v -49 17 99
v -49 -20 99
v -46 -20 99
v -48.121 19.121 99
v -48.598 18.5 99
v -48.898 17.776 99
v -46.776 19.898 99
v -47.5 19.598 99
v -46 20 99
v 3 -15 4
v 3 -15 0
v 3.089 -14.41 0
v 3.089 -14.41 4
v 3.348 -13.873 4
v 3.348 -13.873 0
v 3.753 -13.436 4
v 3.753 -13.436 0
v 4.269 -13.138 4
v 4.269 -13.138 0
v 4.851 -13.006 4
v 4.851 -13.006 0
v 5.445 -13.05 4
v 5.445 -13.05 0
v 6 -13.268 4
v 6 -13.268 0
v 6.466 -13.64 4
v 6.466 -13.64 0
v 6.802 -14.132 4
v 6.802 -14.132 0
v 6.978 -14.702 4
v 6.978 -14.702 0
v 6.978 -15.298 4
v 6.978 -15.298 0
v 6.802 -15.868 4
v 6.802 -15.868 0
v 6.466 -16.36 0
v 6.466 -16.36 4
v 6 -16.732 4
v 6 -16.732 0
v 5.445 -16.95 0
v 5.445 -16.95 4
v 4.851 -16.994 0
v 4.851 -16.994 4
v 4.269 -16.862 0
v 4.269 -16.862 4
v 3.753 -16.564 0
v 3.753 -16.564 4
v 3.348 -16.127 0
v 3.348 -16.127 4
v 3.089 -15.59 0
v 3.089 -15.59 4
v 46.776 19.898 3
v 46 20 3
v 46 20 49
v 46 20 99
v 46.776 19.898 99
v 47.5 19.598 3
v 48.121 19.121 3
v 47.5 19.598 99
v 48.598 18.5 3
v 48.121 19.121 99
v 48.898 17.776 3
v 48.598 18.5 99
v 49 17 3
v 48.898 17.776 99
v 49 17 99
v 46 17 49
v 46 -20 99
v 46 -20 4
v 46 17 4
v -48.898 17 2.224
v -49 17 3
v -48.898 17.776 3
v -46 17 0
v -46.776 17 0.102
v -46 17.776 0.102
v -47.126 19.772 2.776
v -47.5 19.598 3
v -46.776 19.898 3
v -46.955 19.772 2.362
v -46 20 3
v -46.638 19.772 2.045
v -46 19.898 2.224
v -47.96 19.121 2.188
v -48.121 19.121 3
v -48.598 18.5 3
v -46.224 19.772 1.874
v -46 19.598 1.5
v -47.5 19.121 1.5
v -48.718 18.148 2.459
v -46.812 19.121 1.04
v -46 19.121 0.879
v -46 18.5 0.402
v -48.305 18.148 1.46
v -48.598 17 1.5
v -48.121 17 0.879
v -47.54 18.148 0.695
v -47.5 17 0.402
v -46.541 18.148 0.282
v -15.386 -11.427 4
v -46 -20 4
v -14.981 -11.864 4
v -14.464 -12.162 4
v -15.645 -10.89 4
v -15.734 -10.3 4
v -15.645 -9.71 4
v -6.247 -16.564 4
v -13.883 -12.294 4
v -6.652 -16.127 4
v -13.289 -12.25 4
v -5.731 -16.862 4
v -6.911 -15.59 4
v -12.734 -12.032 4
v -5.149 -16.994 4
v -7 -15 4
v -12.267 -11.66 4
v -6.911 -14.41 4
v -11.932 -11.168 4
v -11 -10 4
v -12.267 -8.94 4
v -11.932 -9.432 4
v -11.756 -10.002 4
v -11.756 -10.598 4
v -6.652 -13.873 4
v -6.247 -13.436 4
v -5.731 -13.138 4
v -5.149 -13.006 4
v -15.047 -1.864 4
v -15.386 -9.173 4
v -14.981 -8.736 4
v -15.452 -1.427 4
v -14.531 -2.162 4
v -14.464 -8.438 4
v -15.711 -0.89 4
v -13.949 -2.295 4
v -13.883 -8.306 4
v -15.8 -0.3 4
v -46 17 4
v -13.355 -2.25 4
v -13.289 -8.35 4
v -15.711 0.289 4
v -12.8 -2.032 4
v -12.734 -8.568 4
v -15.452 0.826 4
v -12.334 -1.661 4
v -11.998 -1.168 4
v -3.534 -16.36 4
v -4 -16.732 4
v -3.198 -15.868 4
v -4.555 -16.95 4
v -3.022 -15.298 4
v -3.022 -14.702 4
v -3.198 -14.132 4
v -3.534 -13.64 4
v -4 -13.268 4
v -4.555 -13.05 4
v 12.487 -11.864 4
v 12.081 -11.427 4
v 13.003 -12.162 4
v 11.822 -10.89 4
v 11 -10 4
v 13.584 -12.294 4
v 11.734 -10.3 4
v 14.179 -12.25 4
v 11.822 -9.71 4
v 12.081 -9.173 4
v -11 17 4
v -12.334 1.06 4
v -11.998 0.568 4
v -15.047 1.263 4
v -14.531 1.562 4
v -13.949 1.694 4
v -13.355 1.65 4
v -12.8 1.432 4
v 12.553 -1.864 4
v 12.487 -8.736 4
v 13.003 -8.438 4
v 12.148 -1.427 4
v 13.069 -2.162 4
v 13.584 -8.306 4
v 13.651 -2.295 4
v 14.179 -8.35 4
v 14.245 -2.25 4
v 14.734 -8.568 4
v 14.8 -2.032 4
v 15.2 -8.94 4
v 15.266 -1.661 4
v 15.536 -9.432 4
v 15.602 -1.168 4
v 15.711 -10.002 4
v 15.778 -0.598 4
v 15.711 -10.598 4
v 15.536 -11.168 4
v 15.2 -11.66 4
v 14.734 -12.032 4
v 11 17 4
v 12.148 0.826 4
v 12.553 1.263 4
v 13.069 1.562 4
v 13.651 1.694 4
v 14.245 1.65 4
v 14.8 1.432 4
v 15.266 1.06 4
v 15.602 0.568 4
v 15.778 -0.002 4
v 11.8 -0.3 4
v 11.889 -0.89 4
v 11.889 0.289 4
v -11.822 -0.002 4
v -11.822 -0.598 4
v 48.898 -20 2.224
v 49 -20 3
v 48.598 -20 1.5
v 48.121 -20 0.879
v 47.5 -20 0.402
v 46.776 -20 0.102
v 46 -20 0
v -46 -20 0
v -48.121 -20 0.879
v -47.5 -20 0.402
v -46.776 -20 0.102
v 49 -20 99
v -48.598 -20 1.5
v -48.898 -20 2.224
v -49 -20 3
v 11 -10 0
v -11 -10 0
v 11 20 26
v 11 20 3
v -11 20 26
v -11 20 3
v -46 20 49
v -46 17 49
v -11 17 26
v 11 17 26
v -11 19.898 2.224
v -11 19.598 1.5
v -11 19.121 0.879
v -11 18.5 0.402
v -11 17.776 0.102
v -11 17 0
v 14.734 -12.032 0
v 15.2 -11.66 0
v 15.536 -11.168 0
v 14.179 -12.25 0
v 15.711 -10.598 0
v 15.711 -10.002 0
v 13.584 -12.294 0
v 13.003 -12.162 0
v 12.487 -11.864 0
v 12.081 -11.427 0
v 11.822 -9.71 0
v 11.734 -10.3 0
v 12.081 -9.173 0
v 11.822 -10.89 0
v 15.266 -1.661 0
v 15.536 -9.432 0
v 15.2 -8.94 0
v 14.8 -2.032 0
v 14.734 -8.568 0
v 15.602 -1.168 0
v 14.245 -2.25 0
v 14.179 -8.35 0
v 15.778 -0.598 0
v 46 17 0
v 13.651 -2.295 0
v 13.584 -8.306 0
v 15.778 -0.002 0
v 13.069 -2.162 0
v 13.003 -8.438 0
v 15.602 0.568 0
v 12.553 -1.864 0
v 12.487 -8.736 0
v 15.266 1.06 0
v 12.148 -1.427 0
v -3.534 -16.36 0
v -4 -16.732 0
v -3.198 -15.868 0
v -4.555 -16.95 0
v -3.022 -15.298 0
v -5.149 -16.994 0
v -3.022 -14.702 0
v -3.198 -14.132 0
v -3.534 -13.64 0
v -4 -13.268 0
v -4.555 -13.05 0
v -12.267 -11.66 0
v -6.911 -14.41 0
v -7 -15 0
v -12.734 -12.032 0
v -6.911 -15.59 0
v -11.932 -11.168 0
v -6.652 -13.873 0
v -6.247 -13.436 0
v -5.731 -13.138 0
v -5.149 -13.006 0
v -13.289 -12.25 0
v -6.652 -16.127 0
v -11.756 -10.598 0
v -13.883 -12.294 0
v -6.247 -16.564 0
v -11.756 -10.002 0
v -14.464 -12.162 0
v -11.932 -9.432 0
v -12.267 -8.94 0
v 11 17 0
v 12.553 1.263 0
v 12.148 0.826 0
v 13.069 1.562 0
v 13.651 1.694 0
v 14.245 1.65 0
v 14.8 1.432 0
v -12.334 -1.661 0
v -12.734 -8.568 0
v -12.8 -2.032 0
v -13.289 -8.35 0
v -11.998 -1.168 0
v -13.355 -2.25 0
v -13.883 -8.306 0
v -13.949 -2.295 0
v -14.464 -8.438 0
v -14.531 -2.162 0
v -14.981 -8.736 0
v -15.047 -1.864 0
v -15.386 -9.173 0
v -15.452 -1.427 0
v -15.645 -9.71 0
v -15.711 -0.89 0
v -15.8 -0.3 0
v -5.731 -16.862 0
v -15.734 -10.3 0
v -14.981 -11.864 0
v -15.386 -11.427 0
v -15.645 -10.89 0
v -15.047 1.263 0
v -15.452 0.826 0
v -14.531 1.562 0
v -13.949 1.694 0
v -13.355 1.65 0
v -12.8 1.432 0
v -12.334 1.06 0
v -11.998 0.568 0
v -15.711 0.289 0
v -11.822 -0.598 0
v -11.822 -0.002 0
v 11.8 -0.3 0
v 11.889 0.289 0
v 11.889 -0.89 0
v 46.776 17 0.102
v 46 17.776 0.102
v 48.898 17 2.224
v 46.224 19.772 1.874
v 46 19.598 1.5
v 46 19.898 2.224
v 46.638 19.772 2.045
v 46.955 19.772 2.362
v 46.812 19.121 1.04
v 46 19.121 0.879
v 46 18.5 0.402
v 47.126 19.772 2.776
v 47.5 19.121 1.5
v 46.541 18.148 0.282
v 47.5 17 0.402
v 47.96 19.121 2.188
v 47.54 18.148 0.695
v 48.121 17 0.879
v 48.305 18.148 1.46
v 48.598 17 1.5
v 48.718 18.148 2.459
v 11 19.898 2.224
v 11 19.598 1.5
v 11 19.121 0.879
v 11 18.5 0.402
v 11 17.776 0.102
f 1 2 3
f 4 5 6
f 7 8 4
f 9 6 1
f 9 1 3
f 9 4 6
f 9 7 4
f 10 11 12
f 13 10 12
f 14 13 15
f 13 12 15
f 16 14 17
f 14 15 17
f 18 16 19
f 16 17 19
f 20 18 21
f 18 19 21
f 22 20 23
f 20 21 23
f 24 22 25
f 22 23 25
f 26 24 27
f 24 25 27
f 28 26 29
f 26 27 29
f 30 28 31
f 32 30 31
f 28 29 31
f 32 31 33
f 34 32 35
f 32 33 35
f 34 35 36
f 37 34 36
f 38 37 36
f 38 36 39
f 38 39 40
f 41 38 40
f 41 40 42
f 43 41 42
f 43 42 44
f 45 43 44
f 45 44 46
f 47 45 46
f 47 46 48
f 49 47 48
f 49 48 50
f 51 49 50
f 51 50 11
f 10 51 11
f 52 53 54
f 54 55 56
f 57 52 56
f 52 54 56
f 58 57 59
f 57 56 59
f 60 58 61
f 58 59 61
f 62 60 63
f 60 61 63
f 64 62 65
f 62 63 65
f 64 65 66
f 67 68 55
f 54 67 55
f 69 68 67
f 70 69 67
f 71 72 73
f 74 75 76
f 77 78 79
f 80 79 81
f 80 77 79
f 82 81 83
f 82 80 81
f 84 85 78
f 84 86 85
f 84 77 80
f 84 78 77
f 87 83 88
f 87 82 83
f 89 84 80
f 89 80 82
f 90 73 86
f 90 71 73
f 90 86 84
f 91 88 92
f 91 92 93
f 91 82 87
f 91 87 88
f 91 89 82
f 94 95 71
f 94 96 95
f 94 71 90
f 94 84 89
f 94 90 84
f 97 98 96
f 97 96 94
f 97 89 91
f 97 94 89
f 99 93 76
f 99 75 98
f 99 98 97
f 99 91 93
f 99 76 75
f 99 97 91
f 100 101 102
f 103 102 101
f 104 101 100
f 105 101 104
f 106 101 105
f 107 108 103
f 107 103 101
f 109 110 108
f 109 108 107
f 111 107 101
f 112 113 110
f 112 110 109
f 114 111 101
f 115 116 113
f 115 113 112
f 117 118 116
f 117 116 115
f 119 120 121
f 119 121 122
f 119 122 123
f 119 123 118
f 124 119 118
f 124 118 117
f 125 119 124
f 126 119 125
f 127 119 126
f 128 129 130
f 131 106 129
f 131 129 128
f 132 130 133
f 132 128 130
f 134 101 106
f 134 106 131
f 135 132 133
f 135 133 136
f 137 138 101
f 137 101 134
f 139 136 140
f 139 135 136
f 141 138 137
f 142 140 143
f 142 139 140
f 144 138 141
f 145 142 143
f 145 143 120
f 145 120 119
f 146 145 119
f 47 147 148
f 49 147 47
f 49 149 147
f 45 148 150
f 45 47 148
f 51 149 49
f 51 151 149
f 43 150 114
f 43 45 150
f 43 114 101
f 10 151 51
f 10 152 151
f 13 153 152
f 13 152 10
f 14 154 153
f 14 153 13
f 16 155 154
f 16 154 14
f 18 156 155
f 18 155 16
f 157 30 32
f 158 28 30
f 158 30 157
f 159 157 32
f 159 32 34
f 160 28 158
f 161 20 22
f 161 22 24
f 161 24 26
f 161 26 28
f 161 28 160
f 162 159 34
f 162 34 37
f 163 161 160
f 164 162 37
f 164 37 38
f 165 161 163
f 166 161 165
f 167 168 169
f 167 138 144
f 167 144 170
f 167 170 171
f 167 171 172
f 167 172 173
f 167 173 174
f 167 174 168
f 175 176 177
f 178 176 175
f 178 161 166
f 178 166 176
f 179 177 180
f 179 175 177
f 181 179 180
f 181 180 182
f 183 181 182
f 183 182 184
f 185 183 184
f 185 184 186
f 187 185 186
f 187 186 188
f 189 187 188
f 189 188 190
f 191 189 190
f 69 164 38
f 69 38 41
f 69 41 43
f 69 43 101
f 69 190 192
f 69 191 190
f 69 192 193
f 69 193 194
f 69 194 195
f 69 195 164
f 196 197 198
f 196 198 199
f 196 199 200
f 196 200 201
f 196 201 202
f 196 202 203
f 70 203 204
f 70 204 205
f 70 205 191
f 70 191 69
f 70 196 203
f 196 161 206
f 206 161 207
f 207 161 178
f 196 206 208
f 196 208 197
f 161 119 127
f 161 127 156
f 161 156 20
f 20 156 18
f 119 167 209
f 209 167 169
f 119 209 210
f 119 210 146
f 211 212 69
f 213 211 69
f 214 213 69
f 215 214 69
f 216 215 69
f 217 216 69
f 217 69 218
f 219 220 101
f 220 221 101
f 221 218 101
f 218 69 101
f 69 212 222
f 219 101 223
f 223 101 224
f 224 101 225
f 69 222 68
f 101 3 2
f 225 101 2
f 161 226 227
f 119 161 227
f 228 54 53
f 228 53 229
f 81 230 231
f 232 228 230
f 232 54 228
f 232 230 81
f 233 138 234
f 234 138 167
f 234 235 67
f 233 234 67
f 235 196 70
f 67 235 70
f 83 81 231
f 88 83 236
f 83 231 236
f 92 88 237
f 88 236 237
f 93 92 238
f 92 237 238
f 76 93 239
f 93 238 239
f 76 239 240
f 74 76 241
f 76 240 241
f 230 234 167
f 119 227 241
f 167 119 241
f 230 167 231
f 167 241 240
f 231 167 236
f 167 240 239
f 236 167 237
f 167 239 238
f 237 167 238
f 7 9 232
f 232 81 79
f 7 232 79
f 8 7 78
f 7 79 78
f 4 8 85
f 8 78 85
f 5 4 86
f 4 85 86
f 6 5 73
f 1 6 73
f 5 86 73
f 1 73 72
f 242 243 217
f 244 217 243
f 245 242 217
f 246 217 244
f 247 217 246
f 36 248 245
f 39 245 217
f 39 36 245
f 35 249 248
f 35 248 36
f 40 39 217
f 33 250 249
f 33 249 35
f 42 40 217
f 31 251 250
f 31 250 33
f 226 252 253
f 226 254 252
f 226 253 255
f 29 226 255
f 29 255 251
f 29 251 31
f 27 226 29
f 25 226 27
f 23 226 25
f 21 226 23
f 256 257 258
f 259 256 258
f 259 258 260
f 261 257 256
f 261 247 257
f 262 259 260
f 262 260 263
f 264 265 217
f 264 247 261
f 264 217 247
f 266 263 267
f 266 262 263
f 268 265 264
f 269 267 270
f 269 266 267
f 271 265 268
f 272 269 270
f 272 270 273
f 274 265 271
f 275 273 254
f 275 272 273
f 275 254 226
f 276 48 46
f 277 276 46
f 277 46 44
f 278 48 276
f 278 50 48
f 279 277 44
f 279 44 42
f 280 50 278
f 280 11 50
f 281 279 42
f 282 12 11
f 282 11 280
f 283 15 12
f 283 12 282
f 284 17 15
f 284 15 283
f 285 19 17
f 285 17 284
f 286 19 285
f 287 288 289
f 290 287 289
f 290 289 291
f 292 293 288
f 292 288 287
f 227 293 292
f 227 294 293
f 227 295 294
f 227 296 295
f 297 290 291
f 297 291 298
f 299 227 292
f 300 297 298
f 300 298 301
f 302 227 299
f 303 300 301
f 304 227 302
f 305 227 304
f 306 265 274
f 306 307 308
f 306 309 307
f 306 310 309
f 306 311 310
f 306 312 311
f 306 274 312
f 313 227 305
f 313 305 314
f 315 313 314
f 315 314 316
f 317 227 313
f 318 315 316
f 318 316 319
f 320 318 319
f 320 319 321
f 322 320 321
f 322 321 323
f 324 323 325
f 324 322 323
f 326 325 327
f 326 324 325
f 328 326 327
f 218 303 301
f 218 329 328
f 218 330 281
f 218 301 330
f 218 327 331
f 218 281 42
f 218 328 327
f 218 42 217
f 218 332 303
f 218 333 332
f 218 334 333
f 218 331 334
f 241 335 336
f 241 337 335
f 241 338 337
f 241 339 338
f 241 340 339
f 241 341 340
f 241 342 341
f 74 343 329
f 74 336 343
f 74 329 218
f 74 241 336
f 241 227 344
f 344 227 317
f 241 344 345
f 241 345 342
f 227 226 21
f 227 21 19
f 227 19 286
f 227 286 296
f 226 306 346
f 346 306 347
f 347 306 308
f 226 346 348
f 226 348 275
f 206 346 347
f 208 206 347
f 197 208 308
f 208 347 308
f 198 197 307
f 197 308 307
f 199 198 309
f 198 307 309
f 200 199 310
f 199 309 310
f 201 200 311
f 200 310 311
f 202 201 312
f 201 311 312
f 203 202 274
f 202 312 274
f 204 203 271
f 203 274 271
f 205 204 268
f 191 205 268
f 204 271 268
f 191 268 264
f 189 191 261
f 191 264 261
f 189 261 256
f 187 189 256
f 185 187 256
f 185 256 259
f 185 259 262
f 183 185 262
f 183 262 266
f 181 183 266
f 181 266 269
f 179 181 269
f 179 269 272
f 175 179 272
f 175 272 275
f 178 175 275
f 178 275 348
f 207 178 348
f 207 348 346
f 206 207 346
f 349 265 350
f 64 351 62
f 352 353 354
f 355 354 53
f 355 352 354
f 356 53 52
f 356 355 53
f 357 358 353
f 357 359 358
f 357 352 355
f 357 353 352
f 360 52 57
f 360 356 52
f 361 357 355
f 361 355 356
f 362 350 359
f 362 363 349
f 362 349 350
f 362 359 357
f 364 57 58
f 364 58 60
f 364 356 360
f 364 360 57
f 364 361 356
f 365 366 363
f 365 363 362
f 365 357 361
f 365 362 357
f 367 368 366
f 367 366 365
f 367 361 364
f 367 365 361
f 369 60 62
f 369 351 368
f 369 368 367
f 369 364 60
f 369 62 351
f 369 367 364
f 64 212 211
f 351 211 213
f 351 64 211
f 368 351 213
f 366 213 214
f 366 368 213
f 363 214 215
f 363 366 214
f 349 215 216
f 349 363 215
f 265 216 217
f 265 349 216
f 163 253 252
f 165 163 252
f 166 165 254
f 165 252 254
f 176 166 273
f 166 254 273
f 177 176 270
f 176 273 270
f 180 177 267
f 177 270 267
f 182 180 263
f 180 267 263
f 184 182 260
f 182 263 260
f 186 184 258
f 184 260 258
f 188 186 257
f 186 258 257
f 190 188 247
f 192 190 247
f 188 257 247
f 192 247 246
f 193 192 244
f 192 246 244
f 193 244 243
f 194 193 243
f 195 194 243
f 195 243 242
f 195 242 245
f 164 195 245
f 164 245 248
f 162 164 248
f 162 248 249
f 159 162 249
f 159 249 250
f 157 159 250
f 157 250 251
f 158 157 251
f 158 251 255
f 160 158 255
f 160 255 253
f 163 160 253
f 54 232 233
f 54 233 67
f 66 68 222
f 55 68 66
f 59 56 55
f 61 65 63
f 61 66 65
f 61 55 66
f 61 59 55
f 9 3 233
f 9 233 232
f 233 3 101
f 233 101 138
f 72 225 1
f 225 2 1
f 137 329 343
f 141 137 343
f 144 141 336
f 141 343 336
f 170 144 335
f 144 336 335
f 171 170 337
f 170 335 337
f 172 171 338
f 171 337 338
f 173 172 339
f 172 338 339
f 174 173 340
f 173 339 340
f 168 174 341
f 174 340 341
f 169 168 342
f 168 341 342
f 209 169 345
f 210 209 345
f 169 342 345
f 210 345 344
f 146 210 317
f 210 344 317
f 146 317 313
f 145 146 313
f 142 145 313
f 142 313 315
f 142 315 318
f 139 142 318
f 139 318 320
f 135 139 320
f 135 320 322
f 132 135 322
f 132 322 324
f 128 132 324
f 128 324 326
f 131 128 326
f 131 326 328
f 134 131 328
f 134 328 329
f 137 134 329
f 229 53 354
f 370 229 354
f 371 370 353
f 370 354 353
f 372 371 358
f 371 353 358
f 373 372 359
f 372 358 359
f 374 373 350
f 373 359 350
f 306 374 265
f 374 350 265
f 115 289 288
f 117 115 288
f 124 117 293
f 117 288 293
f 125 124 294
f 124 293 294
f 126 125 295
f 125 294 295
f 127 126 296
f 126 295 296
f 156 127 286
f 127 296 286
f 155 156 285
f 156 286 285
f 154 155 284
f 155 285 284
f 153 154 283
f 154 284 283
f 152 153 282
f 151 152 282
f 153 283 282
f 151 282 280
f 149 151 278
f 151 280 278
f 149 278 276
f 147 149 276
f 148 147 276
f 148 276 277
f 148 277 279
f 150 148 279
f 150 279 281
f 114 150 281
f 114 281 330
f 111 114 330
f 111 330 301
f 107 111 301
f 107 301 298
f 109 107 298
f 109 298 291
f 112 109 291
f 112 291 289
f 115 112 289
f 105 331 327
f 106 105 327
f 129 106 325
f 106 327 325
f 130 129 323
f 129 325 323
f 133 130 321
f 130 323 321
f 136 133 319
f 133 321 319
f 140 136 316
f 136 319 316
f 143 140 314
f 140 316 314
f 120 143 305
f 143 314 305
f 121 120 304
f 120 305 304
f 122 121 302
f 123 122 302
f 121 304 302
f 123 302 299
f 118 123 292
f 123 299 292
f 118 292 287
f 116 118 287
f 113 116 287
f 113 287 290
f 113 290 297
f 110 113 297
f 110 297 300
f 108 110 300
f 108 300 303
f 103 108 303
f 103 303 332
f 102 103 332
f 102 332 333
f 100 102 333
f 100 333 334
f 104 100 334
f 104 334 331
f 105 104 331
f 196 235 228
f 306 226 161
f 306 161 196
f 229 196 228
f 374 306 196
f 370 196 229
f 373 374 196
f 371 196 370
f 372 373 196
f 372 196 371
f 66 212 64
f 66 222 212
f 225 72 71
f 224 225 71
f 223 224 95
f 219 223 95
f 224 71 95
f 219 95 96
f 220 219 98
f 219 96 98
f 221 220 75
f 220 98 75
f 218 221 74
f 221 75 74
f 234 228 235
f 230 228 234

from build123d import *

# Parameters (mm, degrees)
CROQUIS2_W                = 92
CROQUIS2_H                = 40
SALIENTE_EXTRUIR2_DEPTH   = 4
CROQUIS3_W                = 3
CROQUIS3_H                = 40
SALIENTE_EXTRUIR3_DEPTH   = 95
SALIENTE_EXTRUIR3_2_DEPTH = 95
CROQUIS4_W                = 3
CROQUIS4_H                = 40
SALIENTE_EXTRUIR4_DEPTH   = 4
REDONDEO1_R               = 3
CROQUIS5_W                = 92
CROQUIS5_H                = 3
SALIENTE_EXTRUIR5_DEPTH   = 45
REDONDEO2_R               = 3
CROQUIS6_W                = 22
CROQUIS6_H                = 30
CORTAR_EXTRUIR1_DEPTH     = 26
CROQUIS7_R                = 2
CORTAR_EXTRUIR2_DEPTH     = 10


with BuildPart() as part:
    # Croquis2 → Saliente-Extruir2 (new body)
    with BuildSketch(Plane.XY):
        Rectangle(CROQUIS2_W, CROQUIS2_H)
    extrude(amount=SALIENTE_EXTRUIR2_DEPTH)



with BuildPart() as body_2:
    # Croquis3 → Saliente-Extruir3 (new body)
    with BuildSketch(Plane.XY.offset(4)):
        with Locations((-47.5, 0)):
            Rectangle(CROQUIS3_W, CROQUIS3_H)
    extrude(amount=SALIENTE_EXTRUIR3_DEPTH)


with BuildPart() as body_3:
    # Croquis3 → Saliente-Extruir3 2 (new body)
    with BuildSketch(Plane.XY.offset(4)):
        with Locations((47.5, 0)):
            Rectangle(CROQUIS3_W, CROQUIS3_H)
    extrude(amount=SALIENTE_EXTRUIR3_2_DEPTH)


with BuildPart() as part_1:
    add(part.part)

    add(body_2.part)  # Saliente-Extruir4 merges body 2

    add(body_3.part)  # Saliente-Extruir4 merges body 3
    # Croquis4 → Saliente-Extruir4 (add)
    with BuildSketch(Plane(origin=(0, 0, 4), x_dir=(-1, 0, 0), z_dir=(0, 0, -1))):
        with Locations((-47.5, 0)):
            Rectangle(CROQUIS4_W, CROQUIS4_H)
        with Locations((47.5, 0)):
            Rectangle(CROQUIS4_W, CROQUIS4_H)
    extrude(amount=SALIENTE_EXTRUIR4_DEPTH)

    # Redondeo1
    redondeo1_edges = [part_1.edges().sort_by_distance(p)[0] for p in [
        (49, 0, 0),
        (-49, 0, 0),
    ]]
    fillet(redondeo1_edges, radius=REDONDEO1_R)

    # Croquis5 → Saliente-Extruir5 (add)
    with BuildSketch(Plane.XY.offset(4)):
        with Locations((0, 18.5)):
            Rectangle(CROQUIS5_W, CROQUIS5_H)
    extrude(amount=SALIENTE_EXTRUIR5_DEPTH)

    # Redondeo2
    redondeo2_edges = [part_1.edges().sort_by_distance(p)[0] for p in [
        (-48.121320344, 20, 0.878679656),
        (0, 20, 0),
        (48.121320344, 20, 0.878679656),
        (-49, 20, 51),
        (49, 20, 51),
    ]]
    fillet(redondeo2_edges, radius=REDONDEO2_R)

    # Croquis6 → Cortar-Extruir1 (cut)
    with BuildSketch(Plane(origin=(0, 0, 0), x_dir=(-1, 0, 0), z_dir=(0, 0, -1))):
        with Locations((0, 5)):
            Rectangle(CROQUIS6_W, CROQUIS6_H)
    extrude(amount=-CORTAR_EXTRUIR1_DEPTH, mode=Mode.SUBTRACT)

    # Croquis7 → Cortar-Extruir2 (cut)
    with BuildSketch(Plane(origin=(0, 0, 0), x_dir=(-1, 0, 0), z_dir=(0, 0, -1))):
        with Locations((5, -15)):
            Circle(CROQUIS7_R)
        with Locations((-5, -15)):
            Circle(CROQUIS7_R)
        with Locations((13.733587387, -10.3)):
            Circle(CROQUIS7_R)
        with Locations((-13.733587387, -10.3)):
            Circle(CROQUIS7_R)
        with Locations((13.8, -0.300220534)):
            Circle(CROQUIS7_R)
        with Locations((-13.8, -0.300220534)):
            Circle(CROQUIS7_R)
    extrude(amount=-CORTAR_EXTRUIR2_DEPTH, mode=Mode.SUBTRACT)


solid = part_1.part
